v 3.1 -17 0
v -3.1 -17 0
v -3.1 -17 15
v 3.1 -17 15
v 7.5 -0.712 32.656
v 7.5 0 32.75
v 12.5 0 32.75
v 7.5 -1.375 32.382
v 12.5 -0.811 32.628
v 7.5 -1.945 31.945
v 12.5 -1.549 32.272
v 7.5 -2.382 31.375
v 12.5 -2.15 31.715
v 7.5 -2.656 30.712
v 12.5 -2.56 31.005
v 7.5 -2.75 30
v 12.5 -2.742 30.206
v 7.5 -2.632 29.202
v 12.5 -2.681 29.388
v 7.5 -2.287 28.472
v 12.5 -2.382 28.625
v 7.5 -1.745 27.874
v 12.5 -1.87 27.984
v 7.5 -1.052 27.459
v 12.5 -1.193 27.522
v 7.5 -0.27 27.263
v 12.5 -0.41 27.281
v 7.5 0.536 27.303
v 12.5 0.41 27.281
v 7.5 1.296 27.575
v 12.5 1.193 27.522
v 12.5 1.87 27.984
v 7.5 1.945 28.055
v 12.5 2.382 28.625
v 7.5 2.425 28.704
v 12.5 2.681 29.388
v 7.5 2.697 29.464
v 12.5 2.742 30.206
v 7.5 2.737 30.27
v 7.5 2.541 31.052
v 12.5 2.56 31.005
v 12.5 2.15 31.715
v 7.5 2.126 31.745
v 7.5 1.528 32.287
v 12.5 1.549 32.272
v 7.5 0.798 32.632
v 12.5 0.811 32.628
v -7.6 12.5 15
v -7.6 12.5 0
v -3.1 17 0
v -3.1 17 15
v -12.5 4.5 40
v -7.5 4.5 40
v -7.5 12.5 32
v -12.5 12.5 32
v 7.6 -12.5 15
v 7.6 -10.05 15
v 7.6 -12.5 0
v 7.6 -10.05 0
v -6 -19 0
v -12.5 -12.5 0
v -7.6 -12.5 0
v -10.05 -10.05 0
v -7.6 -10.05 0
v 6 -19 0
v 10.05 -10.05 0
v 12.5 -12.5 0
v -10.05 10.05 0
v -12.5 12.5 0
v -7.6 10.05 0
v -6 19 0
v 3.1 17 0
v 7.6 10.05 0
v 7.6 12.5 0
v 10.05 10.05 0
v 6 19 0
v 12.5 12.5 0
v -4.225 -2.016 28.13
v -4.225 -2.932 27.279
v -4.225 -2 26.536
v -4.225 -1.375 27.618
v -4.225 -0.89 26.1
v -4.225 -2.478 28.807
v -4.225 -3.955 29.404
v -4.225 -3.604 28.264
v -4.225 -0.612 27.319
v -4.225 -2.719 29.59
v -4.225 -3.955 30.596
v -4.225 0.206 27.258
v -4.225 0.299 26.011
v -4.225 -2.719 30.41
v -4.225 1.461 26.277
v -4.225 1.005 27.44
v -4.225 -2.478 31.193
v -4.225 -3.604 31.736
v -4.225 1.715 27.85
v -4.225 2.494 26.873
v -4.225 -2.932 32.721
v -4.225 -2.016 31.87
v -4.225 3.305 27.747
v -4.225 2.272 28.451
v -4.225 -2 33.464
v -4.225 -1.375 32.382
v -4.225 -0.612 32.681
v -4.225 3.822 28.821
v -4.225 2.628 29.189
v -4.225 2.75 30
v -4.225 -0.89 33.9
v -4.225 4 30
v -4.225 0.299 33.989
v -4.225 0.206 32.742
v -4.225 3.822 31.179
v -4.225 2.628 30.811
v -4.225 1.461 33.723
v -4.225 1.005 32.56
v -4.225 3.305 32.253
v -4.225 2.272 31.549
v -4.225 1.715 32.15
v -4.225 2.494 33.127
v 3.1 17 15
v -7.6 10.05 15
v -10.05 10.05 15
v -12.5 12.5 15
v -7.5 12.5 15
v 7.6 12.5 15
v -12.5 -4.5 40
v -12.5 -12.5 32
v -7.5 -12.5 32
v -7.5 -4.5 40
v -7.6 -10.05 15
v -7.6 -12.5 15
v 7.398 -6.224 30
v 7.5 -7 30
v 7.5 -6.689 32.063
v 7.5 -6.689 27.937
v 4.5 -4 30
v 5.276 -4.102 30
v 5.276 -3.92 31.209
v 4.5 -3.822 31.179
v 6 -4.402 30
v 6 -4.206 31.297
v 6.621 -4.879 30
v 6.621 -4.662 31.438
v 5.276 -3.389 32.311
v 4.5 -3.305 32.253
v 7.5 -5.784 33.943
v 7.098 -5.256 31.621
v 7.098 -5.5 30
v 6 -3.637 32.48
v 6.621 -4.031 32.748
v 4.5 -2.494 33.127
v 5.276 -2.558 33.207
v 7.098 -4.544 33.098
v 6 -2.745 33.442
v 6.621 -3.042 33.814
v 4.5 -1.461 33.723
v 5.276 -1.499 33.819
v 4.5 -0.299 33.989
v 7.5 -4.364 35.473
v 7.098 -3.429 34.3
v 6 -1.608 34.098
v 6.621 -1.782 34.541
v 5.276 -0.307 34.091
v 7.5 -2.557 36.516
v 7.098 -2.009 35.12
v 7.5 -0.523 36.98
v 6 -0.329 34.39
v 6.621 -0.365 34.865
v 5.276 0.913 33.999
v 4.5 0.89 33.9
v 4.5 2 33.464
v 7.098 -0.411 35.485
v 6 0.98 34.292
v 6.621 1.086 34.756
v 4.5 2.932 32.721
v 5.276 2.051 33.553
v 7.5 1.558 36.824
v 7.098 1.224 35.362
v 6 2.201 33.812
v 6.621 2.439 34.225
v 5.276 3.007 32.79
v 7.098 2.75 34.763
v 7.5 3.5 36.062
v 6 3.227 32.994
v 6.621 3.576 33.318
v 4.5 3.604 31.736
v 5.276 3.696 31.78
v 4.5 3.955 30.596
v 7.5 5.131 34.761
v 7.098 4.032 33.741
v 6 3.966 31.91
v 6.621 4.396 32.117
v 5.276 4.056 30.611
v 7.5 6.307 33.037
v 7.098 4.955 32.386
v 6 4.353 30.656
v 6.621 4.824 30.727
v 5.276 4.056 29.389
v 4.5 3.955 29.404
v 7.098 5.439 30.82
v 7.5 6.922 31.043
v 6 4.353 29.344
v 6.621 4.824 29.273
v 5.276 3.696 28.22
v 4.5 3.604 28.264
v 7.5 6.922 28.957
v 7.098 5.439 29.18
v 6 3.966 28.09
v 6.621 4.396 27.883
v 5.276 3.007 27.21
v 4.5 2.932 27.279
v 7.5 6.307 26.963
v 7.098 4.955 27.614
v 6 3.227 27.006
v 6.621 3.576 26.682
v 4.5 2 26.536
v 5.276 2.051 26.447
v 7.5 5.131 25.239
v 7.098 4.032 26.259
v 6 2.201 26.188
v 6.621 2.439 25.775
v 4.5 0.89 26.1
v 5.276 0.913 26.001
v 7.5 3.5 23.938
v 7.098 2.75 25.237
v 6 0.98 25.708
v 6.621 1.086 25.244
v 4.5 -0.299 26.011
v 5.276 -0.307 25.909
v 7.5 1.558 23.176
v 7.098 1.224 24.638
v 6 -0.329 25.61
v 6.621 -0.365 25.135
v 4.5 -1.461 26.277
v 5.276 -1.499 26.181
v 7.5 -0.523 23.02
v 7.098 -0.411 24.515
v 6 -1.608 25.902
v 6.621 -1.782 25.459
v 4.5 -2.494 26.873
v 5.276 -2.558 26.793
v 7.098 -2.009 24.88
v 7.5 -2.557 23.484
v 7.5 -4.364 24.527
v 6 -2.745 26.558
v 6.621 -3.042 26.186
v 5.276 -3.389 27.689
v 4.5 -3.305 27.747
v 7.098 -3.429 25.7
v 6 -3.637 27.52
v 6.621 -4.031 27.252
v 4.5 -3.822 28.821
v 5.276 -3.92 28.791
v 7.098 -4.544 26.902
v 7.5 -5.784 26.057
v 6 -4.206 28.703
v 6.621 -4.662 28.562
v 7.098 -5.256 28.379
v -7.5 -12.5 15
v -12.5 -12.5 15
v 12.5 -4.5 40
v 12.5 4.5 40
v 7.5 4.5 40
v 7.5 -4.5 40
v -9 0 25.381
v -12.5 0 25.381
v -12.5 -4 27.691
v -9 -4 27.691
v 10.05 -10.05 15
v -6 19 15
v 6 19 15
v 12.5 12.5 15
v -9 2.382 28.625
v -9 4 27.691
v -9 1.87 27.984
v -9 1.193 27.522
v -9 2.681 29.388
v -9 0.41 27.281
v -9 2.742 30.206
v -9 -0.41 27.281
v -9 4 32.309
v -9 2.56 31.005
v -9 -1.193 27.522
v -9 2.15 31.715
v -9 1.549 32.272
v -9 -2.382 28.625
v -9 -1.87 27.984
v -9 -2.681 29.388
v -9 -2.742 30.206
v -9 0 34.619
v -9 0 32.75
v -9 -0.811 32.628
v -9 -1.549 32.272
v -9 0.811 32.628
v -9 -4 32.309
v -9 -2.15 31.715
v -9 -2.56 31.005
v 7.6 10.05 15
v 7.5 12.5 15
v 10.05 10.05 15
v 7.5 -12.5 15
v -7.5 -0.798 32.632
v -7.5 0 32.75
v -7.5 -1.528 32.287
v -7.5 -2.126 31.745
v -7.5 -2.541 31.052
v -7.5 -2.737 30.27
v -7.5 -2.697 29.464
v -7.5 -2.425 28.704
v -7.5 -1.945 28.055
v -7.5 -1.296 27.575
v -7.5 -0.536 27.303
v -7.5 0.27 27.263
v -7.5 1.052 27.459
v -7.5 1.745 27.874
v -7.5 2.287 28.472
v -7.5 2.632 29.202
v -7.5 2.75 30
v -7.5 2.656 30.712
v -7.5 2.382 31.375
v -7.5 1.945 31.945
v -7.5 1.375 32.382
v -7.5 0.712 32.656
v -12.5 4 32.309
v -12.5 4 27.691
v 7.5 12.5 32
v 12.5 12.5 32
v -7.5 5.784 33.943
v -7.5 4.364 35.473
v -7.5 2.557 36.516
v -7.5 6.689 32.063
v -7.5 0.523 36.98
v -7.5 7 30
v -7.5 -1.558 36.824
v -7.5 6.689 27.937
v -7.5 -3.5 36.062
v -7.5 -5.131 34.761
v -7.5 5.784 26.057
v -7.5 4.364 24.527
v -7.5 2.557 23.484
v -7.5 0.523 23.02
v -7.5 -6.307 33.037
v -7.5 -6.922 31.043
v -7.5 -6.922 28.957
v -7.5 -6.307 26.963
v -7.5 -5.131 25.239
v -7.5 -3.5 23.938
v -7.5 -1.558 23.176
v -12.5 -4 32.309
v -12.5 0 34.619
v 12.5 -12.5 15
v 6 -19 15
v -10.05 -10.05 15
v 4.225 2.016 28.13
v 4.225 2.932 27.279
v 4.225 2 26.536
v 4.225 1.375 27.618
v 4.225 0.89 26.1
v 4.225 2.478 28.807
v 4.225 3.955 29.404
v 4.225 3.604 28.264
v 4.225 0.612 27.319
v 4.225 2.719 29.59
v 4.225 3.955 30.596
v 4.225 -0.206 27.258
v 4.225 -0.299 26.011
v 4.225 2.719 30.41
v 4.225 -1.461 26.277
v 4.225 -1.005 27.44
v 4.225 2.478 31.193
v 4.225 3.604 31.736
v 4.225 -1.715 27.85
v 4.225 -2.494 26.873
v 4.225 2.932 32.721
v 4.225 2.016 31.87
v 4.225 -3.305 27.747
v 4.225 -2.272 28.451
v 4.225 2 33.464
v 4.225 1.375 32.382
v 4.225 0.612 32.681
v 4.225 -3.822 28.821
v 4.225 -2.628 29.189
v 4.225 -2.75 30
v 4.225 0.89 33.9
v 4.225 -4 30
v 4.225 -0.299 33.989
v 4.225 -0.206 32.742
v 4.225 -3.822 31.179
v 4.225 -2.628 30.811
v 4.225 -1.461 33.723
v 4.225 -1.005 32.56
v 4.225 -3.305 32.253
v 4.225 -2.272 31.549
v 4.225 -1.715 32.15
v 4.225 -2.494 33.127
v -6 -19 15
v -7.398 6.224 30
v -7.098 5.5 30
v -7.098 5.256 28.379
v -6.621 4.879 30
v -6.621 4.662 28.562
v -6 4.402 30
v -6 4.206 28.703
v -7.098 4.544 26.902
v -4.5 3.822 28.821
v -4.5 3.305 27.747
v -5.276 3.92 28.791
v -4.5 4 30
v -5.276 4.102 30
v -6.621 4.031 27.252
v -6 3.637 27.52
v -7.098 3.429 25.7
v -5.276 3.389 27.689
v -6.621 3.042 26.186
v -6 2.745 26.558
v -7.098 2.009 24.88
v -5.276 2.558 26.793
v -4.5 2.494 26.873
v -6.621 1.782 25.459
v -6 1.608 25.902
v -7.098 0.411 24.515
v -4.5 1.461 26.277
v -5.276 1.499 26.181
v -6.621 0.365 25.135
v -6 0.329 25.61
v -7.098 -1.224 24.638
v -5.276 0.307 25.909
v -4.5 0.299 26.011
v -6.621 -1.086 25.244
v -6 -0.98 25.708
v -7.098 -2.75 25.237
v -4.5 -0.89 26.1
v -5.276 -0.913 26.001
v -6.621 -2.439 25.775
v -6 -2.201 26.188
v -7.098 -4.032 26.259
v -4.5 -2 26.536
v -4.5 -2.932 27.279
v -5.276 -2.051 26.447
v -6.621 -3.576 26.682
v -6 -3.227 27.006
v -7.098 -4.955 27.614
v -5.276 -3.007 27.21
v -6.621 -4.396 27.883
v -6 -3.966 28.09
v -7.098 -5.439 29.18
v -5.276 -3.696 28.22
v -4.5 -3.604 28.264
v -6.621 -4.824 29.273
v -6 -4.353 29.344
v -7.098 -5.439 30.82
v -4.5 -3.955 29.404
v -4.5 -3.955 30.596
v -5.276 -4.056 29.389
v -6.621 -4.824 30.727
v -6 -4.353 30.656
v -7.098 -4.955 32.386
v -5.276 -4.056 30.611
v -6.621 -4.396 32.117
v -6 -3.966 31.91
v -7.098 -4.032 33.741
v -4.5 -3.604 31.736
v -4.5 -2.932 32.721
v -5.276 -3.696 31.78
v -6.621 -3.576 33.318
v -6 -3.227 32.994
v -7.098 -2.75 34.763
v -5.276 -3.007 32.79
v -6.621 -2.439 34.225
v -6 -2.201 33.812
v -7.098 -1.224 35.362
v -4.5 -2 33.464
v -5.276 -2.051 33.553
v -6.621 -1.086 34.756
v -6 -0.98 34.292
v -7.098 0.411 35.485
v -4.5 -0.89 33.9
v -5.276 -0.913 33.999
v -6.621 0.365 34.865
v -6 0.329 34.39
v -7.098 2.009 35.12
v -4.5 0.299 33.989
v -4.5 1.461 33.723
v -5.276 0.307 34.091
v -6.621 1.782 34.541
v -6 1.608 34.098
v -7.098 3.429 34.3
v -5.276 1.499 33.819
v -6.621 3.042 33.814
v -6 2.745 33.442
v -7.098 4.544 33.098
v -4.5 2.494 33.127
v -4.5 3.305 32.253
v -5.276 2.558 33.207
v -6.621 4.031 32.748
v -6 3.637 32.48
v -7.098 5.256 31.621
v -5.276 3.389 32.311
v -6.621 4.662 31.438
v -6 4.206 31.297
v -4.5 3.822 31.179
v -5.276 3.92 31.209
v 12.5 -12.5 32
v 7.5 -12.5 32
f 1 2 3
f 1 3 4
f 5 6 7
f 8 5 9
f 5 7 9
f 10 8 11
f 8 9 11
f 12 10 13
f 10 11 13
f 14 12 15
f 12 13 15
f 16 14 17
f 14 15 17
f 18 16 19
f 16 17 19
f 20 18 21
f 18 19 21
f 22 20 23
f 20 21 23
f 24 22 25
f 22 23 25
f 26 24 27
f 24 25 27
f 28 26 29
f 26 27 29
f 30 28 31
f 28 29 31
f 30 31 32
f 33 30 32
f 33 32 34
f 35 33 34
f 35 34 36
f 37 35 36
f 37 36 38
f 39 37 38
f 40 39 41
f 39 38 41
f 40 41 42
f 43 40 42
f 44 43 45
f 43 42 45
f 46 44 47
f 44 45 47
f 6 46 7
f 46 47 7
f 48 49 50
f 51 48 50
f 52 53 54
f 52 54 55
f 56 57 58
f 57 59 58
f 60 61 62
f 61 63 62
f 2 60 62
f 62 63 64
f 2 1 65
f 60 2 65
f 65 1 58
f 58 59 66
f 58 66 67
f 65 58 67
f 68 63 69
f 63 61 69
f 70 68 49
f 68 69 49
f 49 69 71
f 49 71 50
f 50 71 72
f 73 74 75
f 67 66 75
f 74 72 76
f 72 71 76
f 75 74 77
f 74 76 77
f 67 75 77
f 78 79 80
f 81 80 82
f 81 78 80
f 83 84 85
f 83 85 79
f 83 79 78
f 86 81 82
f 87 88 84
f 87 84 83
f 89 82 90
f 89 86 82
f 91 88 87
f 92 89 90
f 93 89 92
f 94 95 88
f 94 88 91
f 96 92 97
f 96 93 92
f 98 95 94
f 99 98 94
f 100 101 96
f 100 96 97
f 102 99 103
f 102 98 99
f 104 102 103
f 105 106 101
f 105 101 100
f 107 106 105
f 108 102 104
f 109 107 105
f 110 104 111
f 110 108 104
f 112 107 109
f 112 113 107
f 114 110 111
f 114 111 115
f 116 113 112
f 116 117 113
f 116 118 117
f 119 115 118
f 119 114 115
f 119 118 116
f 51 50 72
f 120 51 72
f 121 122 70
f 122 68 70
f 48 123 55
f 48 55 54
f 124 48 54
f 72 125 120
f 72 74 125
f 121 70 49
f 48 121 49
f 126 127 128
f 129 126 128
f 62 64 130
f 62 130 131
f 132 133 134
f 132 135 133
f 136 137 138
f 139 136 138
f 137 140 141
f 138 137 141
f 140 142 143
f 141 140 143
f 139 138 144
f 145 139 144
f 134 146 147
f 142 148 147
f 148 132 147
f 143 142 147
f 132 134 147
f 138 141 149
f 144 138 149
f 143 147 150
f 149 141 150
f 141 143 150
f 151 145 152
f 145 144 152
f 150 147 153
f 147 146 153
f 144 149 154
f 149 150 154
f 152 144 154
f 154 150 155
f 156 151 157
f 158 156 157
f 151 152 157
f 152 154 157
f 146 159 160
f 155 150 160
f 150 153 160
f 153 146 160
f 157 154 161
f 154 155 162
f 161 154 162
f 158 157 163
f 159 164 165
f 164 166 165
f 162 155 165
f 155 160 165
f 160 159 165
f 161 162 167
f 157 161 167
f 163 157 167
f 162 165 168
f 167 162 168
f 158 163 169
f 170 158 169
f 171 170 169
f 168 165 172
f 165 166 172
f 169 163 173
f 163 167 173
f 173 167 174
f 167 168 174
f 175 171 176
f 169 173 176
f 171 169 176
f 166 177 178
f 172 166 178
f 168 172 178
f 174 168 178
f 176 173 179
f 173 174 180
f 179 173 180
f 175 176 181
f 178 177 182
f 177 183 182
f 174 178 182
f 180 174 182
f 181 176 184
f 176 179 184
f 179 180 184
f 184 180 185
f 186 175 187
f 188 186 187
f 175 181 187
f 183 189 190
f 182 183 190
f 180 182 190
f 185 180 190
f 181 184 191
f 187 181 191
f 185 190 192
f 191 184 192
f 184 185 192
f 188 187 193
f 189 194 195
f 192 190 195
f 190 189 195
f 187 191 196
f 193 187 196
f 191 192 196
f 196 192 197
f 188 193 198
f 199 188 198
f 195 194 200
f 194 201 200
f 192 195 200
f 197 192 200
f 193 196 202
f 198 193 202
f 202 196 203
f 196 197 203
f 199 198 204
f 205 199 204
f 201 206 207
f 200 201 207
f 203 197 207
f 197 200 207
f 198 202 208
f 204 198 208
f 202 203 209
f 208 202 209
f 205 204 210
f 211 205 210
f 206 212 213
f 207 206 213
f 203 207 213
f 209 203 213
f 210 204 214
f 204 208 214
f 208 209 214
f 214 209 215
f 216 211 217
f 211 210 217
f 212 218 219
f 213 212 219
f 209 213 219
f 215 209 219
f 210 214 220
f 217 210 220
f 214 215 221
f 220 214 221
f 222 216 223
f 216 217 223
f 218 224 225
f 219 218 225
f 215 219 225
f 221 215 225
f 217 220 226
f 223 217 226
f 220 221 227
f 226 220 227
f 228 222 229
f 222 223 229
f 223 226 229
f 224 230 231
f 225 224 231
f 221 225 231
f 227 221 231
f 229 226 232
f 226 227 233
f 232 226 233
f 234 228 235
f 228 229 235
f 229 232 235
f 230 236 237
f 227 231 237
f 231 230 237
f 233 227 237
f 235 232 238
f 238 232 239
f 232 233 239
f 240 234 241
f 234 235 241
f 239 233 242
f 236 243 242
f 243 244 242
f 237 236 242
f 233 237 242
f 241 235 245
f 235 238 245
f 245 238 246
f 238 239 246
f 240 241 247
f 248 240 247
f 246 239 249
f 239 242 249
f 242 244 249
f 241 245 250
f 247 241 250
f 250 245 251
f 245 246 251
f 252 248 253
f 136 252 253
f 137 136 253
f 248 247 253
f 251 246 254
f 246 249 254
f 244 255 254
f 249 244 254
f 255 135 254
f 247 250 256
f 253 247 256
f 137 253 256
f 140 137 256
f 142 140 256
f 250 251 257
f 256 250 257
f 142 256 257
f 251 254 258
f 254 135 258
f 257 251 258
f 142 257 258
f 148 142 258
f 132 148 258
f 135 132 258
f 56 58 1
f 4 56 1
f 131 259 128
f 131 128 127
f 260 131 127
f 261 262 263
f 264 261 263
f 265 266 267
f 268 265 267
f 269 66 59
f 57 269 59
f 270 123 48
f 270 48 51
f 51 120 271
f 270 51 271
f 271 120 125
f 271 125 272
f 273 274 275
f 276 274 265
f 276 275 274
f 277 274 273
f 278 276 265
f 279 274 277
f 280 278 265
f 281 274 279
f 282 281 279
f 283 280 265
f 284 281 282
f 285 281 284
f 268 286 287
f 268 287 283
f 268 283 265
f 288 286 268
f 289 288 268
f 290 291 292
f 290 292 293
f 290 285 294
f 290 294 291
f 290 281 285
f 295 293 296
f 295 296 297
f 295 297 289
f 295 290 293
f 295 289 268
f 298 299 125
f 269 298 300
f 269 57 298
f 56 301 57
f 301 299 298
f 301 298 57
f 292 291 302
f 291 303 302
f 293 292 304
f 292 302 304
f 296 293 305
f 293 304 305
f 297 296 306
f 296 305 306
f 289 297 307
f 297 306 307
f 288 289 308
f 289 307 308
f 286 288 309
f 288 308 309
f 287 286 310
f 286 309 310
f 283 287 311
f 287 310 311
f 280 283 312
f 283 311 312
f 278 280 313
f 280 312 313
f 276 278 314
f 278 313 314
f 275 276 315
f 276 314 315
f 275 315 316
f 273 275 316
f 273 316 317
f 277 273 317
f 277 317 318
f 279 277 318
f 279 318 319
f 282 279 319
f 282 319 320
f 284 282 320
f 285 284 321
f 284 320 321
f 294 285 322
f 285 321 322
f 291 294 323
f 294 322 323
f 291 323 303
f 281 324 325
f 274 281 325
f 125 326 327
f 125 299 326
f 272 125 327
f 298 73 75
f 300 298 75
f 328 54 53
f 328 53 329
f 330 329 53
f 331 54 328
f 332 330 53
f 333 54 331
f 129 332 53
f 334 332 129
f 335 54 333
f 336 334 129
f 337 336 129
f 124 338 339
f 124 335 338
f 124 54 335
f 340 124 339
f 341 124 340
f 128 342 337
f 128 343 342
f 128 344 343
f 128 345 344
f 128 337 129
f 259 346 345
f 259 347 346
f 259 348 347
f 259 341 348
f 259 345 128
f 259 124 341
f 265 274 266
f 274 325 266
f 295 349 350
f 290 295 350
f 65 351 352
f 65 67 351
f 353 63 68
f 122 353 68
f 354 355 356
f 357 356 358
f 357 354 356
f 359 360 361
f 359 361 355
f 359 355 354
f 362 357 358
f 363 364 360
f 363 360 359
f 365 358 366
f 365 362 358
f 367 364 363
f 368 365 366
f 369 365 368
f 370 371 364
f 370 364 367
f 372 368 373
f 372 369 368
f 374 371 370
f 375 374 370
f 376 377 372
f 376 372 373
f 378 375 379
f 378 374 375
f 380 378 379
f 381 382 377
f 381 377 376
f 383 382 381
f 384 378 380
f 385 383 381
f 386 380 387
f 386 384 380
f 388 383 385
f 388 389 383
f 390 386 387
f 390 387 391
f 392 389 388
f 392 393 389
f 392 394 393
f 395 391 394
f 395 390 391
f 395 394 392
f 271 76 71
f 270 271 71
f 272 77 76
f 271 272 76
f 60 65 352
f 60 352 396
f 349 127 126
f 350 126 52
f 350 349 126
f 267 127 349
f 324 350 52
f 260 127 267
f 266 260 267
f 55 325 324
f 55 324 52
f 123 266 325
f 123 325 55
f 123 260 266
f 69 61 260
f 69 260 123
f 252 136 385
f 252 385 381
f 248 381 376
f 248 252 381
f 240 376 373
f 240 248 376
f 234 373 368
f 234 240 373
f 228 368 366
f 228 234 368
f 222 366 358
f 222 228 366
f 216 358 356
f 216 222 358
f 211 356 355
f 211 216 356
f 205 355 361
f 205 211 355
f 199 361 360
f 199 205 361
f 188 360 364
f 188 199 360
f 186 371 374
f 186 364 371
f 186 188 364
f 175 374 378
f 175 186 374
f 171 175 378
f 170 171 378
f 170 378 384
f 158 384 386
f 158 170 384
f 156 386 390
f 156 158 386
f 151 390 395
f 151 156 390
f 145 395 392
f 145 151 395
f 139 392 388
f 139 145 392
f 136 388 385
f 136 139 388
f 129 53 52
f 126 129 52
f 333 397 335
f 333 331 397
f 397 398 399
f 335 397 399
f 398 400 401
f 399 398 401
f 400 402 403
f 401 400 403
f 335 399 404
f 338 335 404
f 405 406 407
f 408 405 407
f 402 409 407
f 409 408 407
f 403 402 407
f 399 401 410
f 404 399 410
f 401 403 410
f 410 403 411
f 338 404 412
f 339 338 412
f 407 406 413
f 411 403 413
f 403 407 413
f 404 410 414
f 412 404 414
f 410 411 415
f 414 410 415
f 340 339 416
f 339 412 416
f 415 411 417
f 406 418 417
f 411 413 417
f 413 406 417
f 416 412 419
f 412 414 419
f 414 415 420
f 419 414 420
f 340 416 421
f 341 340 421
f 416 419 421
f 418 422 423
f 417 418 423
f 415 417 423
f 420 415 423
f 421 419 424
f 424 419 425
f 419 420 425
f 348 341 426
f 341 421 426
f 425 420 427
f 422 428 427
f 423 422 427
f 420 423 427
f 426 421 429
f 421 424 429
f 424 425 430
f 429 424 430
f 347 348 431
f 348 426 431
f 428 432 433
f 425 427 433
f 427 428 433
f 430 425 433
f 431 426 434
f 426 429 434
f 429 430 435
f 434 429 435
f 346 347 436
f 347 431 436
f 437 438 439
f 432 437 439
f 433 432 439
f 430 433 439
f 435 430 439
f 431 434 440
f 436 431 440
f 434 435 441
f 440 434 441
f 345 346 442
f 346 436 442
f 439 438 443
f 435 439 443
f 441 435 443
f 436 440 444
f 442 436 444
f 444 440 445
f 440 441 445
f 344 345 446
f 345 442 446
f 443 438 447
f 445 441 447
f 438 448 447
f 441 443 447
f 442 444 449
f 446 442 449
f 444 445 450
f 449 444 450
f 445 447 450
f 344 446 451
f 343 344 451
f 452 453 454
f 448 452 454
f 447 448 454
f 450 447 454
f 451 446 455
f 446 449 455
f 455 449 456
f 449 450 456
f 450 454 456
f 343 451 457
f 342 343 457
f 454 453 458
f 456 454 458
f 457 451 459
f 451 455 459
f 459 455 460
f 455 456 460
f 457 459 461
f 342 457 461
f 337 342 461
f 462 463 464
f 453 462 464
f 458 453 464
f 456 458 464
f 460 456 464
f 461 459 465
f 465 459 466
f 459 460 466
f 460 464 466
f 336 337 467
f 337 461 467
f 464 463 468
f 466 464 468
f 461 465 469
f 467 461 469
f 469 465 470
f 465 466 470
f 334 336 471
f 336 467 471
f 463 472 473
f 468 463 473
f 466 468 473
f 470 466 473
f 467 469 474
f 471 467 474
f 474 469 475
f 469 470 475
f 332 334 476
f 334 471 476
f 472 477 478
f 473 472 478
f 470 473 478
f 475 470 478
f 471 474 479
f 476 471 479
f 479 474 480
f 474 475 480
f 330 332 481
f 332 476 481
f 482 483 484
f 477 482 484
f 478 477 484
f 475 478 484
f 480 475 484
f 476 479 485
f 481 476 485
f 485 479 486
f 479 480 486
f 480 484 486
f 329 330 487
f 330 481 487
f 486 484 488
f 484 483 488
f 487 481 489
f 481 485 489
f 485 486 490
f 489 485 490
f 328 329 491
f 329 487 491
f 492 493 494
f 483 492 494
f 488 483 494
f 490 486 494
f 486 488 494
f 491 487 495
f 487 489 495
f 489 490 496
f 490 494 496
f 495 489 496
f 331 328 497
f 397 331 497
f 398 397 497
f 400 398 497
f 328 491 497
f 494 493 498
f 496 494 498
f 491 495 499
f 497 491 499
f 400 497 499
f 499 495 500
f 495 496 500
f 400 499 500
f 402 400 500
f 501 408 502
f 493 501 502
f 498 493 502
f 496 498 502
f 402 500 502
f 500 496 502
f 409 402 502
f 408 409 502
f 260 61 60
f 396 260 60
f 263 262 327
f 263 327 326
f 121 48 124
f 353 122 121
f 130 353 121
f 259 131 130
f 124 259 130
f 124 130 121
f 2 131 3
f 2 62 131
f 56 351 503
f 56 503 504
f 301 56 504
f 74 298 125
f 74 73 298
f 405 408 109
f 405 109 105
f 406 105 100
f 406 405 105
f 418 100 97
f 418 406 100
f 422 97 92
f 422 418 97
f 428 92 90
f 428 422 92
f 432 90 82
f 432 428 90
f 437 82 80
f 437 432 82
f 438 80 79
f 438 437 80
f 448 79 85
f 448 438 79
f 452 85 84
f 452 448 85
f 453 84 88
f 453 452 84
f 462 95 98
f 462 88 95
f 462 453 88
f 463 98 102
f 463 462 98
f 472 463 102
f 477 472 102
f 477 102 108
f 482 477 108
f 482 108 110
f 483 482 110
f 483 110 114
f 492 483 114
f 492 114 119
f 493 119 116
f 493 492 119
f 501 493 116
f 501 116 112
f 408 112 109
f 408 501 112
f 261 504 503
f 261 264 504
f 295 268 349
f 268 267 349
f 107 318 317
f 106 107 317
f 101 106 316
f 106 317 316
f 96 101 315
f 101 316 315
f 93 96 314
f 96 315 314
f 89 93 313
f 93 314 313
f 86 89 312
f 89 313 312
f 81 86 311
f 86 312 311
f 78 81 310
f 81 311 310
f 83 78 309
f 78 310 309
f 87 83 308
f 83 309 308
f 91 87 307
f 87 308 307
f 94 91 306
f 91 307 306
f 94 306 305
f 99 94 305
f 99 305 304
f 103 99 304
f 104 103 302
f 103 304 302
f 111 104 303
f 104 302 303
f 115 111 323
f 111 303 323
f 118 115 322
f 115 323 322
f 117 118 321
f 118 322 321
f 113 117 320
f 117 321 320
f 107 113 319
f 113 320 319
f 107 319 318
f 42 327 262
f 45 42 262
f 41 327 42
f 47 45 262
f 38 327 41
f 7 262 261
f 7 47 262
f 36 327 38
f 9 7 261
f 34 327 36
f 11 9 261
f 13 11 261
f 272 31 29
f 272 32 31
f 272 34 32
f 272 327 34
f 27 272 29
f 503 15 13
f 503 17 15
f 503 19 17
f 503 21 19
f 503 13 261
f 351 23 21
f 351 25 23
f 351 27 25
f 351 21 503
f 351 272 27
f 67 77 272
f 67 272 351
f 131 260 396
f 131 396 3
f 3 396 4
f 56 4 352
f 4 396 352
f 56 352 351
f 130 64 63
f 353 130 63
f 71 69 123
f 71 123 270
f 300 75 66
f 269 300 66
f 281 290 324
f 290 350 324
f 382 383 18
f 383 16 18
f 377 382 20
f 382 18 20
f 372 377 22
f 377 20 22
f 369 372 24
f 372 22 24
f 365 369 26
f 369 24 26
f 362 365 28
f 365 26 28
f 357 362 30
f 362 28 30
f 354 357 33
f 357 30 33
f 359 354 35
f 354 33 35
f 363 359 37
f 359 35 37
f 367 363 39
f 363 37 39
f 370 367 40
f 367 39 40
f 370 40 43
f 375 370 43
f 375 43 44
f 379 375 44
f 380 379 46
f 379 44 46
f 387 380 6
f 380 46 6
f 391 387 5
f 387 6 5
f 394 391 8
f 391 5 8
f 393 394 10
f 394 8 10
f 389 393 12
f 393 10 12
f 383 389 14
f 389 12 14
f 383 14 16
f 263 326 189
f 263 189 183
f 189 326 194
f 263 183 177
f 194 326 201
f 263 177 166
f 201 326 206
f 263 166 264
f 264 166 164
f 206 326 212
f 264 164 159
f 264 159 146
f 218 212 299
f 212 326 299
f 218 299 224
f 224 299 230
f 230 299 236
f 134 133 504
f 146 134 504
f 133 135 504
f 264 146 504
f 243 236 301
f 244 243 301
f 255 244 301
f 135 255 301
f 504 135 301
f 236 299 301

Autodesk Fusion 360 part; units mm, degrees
sketch "Sketch1" plane through (0, 0, 0) normal (0, 0, 1) x (1, 0, 0)
  line L0 (12.5, -12.5) -> (-12.5, -12.5)
  line L1 (-12.5, -12.5) -> (-12.5, 12.5)
  line L2 (-12.5, 12.5) -> (12.5, 12.5)
  line L3 (12.5, 12.5) -> (12.5, -12.5)
  line L4 (12.5, -12.5) -> (-12.5, 12.5) construction
  line L5 (-12.5, -12.5) -> (12.5, 12.5) construction
  line L6 (10.05, -10.05) -> (-10.05, -10.05)
  line L7 (-10.05, -10.05) -> (-10.05, 10.05)
  line L8 (-10.05, 10.05) -> (10.05, 10.05)
  line L9 (10.05, 10.05) -> (10.05, -10.05)
  line L10 (10.05, -10.05) -> (-10.05, 10.05) construction
  line L11 (-10.05, -10.05) -> (10.05, 10.05) construction
  dimension "d3" = 25
  dimension "d4" = 25
  dimension "d5" = 20.1
  dimension "d6" = 20.1
extrude "Extrude1" add sketch "Sketch1" along normal blind 15 makes body 1
sketch "Sketch2" plane through (0, 0, 15) normal (0, 0, 1) x (-1, 0, 0)
  line L0 (10.05, -10.05) -> (-10.05, -10.05)
  line L1 (-10.05, -10.05) -> (-10.05, 10.05)
  line L2 (-10.05, 10.05) -> (10.05, 10.05)
  line L3 (10.05, 10.05) -> (10.05, -10.05)
  line L4 (-12.5, -12.5) -> (12.5, -12.5)
  line L5 (12.5, -12.5) -> (12.5, 12.5)
  line L6 (12.5, 12.5) -> (-12.5, 12.5)
  line L7 (-12.5, 12.5) -> (-12.5, -12.5)
  line L8 (12.5, -12.5) -> (7.5, -12.5)
  line L9 (7.5, -12.5) -> (7.5, 12.5)
  line L10 (7.5, 12.5) -> (12.5, 12.5)
  line L11 (12.5, 12.5) -> (12.5, -12.5)
  line L12 (-12.5, -12.5) -> (-7.5, -12.5)
  line L13 (-7.5, -12.5) -> (-7.5, 12.5)
  line L14 (-7.5, 12.5) -> (-12.5, 12.5)
  line L15 (-12.5, 12.5) -> (-12.5, -12.5)
  dimension "d9" = 5
  dimension "d10" = 5
extrude "Extrude2" add sketch "Sketch2" along normal blind 25 contours L0 L2 L3 L4 L5 L6 L8 L9 L10 L11 | L0 L2 L3 L9 | L0 L1 L2 L4 L6 L7 L12 L13 L14 L15 | L0 L1 L2 L13 bodies 1
sketch "Sketch3" plane through (-12.5, 0, 0) normal (-1, 0, 0) x (0, -1, 0)
  line L0 (-12.5, 0) -> (12.5, 0)
  line L1 (12.5, 0) -> (12.5, 40)
  line L2 (12.5, 40) -> (-12.5, 40)
  line L3 (-12.5, 40) -> (-12.5, 0)
  line L4 (0, 40) -> (0, 0) construction
  line L5 (4, 32.3094) -> (0, 34.6188)
  line L6 (0, 34.6188) -> (-4, 32.3094)
  line L7 (-4, 32.3094) -> (-4, 27.6906)
  line L8 (-4, 27.6906) -> (0, 25.3812)
  line L9 (0, 25.3812) -> (4, 27.6906)
  line L10 (4, 27.6906) -> (4, 32.3094)
  point P0 (0, 30)
  point P1 (0, 30)
  dimension "d13" = 10
  dimension "d27" = 4
hole "Hole1" at (-12.5, 0, 30) direction (1, 0, 0) diameter 5.5 end through all bodies 1 1
sketch "Sketch4" plane through (-7.5, 0, 0) normal (1, 0, 0) x (0, 1, 0)
  circle A0 centre (0, 30) radius 2.75
  line L0 (10.05, 15) -> (12.5, 15)
  line L1 (12.5, 15) -> (12.5, 40)
  line L2 (12.5, 40) -> (-12.5, 40)
  line L3 (-12.5, 40) -> (-12.5, 15)
  line L4 (-12.5, 15) -> (-10.05, 15)
  line L5 (-10.05, 15) -> (10.05, 15)
  circle A1 centre (0, 30) radius 4
  dimension "d17" = 8
sketch "Sketch5" plane through (7.5, 0, 0) normal (-1, 0, 0) x (0, -1, 0)
  circle A0 centre (0, 30) radius 2.75
  line L0 (-12.5, 15) -> (-10.05, 15)
  line L1 (-10.05, 15) -> (10.05, 15)
  line L2 (10.05, 15) -> (12.5, 15)
  line L3 (12.5, 15) -> (12.5, 40)
  line L4 (12.5, 40) -> (-12.5, 40)
  line L5 (-12.5, 40) -> (-12.5, 15)
  circle A1 centre (0, 30) radius 4
  dimension "d22" = 8
extrude "Extrude3" add sketch "Sketch4" along normal blind 3.275 contours A1 bodies 1
extrude "Extrude4" add sketch "Sketch5" along normal blind 3.275 contours A1 bodies 1
fillet "Fillet2" radius 3 2 edges at (7.5, 3.7293, 31.4465) (-7.5, -3.7293, 31.4465) on bodies 1
extrude "Extrude5" cut sketch "Sketch3" against normal blind 3.5 contours L5 L6 L7 L8 L9 L10 bodies 1
sketch "Sketch6" plane through (0, 0, 0) normal (0, 0, -1) x (1, 0, 0)
  line L0 (10.05, -10.05) -> (-10.05, -10.05)
  line L1 (-10.05, -10.05) -> (-10.05, 10.05)
  line L2 (-10.05, 10.05) -> (10.05, 10.05)
  line L3 (10.05, 10.05) -> (10.05, -10.05)
  line L4 (-12.5, -12.5) -> (12.5, -12.5)
  line L5 (12.5, -12.5) -> (12.5, 12.5)
  line L6 (12.5, 12.5) -> (-12.5, 12.5)
  line L7 (-12.5, 12.5) -> (-12.5, -12.5)
  line L8 (-7.5, -10.05) -> (-7.5, 10.05)
  line L9 (7.5, -10.05) -> (7.5, 10.05)
  line L10 (-12.5, 12.5) -> (-6, 19)
  line L11 (-6, 19) -> (0, 19)
  line L12 (0, 19) -> (0, 17)
  line L13 (-10.05, 10.05) -> (-3.1, 17)
  line L14 (0, 17) -> (-3.1, 17)
  line L15 (-7.6, 10.05) -> (-7.6, 12.5)
  line L16 (0, -1.75) -> (0, -22.5)
  line L17 (0, 17) -> (3.1, 17)
  line L18 (6, 19) -> (0, 19)
  line L19 (0, 19) -> (0, 17)
  line L20 (10.05, 10.05) -> (3.1, 17)
  line L21 (12.5, 12.5) -> (6, 19)
  line L22 (7.6, 10.05) -> (7.6, 12.5)
  line L23 (1.75, 0) -> (22.5, 0)
  line L24 (10.05, -10.05) -> (3.1, -17)
  line L25 (7.6, -10.05) -> (7.6, -12.5)
  line L26 (12.5, -12.5) -> (6, -19)
  line L27 (6, -19) -> (0, -19)
  line L28 (0, -17) -> (3.1, -17)
  line L29 (0, -17) -> (-3.1, -17)
  line L30 (-6, -19) -> (0, -19)
  line L31 (-12.5, -12.5) -> (-6, -19)
  line L32 (-10.05, -10.05) -> (-3.1, -17)
  line L33 (-7.6, -10.05) -> (-7.6, -12.5)
  dimension "d30" = 2
  dimension "d31" = 45
  dimension "d37" = 6.5
extrude "Extrude6" cut sketch "Sketch6" against normal blind 15 contours L0 L4 L16 L25 | L0 L4 L16 L33 | L2 L6 L15 L22 bodies 1 makes body 2 at (-12.5, 0, 8.4604)
extrude "Extrude7" add sketch "Sketch6" against normal blind 15 contours L4 L16 L24 L26 L27 L28 | L6 L12 L17 L18 L19 L20 L21 | L4 L16 L29 L30 L31 L32 | L6 L10 L11 L12 L13 L14 L19 bodies 1 2
chamfer "Chamfer1" distance 8 angle 45 4 edges at (10, -12.5, 40) (-10, -12.5, 40) (-10, 12.5, 40) (10, 12.5, 40) on bodies 1 2
fillet "Fillet1" [suppressed]
